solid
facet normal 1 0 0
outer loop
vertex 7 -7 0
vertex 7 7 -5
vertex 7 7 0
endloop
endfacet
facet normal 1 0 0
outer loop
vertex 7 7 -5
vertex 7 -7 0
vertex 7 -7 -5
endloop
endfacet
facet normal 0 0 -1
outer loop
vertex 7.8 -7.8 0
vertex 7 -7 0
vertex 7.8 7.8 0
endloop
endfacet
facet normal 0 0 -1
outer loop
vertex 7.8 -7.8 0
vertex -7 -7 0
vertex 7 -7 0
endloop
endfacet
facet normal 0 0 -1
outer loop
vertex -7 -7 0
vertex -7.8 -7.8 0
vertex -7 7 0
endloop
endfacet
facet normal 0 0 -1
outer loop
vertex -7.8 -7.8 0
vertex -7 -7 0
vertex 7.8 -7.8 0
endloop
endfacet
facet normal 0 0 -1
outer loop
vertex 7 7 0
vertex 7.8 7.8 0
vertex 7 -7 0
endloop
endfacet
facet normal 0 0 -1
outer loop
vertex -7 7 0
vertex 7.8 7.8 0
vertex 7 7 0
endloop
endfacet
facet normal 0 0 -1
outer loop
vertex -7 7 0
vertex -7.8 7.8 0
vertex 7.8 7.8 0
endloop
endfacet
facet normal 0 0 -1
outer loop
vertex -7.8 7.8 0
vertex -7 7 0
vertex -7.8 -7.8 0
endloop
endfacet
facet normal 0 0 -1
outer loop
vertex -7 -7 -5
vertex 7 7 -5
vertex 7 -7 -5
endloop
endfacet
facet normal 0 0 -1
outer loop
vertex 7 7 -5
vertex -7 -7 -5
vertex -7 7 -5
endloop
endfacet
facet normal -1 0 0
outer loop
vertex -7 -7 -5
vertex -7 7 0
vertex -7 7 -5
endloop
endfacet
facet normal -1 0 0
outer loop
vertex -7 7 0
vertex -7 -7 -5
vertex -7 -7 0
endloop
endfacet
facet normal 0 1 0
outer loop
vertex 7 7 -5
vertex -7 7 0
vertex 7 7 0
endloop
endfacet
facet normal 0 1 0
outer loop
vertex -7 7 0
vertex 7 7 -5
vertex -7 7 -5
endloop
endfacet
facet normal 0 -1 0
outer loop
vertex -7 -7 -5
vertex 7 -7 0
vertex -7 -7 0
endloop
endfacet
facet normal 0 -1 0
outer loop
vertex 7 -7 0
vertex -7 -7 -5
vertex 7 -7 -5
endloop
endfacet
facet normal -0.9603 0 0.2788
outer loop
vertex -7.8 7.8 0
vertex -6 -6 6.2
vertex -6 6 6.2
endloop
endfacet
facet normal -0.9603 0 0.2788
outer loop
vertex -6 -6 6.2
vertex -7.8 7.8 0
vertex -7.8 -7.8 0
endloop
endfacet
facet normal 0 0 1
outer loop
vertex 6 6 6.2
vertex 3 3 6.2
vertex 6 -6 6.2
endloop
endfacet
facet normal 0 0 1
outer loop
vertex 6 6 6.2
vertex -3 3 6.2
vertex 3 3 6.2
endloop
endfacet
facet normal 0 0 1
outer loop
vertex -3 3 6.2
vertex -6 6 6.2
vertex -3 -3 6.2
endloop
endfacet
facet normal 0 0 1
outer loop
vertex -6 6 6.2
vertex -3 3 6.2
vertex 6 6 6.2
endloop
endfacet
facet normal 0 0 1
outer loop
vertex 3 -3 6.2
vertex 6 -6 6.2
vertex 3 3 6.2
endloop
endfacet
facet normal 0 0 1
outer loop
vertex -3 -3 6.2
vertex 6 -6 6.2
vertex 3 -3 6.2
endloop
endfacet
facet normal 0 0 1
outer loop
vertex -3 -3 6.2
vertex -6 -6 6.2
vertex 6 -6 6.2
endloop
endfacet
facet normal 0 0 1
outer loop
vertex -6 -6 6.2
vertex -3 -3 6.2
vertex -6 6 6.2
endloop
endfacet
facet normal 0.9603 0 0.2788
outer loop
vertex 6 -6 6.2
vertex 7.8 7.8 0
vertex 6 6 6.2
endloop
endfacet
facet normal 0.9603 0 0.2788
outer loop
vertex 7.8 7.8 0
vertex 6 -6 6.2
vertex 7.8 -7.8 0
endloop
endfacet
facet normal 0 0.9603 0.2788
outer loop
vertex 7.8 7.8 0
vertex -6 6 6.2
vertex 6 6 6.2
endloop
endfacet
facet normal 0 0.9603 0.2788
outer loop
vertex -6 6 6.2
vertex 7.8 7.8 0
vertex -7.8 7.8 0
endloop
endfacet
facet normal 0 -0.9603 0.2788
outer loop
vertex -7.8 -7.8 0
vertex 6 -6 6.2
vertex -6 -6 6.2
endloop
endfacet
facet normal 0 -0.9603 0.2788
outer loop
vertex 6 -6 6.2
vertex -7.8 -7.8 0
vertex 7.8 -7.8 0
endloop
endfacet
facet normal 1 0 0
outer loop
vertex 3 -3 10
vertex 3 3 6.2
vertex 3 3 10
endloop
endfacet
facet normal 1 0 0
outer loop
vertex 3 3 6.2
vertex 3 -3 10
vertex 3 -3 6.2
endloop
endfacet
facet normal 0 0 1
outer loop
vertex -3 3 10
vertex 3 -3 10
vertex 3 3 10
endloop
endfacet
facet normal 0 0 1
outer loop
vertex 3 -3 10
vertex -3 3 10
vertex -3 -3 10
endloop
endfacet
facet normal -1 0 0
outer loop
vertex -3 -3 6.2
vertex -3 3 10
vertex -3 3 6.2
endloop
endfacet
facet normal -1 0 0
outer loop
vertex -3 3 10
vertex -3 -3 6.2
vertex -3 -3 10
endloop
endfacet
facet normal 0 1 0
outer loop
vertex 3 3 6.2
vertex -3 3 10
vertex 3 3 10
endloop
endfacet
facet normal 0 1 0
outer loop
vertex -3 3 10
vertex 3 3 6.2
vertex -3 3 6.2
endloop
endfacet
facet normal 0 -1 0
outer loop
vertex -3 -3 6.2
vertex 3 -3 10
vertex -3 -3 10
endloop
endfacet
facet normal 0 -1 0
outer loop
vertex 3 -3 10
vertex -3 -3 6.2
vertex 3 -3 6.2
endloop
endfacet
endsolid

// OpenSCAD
// Parameters
base_width = 14;  
base_height = 5;
cover_bottom_width = 15.6;  
cover_top_width = 12;   
cover_height = 6.2;       
stem_width = 6;          
stem_height = 3.8;         

module switch() {
    // Bottom part
    translate([0, 0, -base_height / 2])
        cube([base_width, base_width, base_height], center = true);
    
    // Base using linear_extrude
    linear_extrude(height = cover_height, scale = cover_top_width / cover_bottom_width)
        square([cover_bottom_width, cover_bottom_width], center = true);

    // Stem on top of the housing
    translate([0, 0, cover_height + stem_height/2])
        cube([stem_width, stem_width, stem_height], center = true);
}

// Render the switch
switch();
